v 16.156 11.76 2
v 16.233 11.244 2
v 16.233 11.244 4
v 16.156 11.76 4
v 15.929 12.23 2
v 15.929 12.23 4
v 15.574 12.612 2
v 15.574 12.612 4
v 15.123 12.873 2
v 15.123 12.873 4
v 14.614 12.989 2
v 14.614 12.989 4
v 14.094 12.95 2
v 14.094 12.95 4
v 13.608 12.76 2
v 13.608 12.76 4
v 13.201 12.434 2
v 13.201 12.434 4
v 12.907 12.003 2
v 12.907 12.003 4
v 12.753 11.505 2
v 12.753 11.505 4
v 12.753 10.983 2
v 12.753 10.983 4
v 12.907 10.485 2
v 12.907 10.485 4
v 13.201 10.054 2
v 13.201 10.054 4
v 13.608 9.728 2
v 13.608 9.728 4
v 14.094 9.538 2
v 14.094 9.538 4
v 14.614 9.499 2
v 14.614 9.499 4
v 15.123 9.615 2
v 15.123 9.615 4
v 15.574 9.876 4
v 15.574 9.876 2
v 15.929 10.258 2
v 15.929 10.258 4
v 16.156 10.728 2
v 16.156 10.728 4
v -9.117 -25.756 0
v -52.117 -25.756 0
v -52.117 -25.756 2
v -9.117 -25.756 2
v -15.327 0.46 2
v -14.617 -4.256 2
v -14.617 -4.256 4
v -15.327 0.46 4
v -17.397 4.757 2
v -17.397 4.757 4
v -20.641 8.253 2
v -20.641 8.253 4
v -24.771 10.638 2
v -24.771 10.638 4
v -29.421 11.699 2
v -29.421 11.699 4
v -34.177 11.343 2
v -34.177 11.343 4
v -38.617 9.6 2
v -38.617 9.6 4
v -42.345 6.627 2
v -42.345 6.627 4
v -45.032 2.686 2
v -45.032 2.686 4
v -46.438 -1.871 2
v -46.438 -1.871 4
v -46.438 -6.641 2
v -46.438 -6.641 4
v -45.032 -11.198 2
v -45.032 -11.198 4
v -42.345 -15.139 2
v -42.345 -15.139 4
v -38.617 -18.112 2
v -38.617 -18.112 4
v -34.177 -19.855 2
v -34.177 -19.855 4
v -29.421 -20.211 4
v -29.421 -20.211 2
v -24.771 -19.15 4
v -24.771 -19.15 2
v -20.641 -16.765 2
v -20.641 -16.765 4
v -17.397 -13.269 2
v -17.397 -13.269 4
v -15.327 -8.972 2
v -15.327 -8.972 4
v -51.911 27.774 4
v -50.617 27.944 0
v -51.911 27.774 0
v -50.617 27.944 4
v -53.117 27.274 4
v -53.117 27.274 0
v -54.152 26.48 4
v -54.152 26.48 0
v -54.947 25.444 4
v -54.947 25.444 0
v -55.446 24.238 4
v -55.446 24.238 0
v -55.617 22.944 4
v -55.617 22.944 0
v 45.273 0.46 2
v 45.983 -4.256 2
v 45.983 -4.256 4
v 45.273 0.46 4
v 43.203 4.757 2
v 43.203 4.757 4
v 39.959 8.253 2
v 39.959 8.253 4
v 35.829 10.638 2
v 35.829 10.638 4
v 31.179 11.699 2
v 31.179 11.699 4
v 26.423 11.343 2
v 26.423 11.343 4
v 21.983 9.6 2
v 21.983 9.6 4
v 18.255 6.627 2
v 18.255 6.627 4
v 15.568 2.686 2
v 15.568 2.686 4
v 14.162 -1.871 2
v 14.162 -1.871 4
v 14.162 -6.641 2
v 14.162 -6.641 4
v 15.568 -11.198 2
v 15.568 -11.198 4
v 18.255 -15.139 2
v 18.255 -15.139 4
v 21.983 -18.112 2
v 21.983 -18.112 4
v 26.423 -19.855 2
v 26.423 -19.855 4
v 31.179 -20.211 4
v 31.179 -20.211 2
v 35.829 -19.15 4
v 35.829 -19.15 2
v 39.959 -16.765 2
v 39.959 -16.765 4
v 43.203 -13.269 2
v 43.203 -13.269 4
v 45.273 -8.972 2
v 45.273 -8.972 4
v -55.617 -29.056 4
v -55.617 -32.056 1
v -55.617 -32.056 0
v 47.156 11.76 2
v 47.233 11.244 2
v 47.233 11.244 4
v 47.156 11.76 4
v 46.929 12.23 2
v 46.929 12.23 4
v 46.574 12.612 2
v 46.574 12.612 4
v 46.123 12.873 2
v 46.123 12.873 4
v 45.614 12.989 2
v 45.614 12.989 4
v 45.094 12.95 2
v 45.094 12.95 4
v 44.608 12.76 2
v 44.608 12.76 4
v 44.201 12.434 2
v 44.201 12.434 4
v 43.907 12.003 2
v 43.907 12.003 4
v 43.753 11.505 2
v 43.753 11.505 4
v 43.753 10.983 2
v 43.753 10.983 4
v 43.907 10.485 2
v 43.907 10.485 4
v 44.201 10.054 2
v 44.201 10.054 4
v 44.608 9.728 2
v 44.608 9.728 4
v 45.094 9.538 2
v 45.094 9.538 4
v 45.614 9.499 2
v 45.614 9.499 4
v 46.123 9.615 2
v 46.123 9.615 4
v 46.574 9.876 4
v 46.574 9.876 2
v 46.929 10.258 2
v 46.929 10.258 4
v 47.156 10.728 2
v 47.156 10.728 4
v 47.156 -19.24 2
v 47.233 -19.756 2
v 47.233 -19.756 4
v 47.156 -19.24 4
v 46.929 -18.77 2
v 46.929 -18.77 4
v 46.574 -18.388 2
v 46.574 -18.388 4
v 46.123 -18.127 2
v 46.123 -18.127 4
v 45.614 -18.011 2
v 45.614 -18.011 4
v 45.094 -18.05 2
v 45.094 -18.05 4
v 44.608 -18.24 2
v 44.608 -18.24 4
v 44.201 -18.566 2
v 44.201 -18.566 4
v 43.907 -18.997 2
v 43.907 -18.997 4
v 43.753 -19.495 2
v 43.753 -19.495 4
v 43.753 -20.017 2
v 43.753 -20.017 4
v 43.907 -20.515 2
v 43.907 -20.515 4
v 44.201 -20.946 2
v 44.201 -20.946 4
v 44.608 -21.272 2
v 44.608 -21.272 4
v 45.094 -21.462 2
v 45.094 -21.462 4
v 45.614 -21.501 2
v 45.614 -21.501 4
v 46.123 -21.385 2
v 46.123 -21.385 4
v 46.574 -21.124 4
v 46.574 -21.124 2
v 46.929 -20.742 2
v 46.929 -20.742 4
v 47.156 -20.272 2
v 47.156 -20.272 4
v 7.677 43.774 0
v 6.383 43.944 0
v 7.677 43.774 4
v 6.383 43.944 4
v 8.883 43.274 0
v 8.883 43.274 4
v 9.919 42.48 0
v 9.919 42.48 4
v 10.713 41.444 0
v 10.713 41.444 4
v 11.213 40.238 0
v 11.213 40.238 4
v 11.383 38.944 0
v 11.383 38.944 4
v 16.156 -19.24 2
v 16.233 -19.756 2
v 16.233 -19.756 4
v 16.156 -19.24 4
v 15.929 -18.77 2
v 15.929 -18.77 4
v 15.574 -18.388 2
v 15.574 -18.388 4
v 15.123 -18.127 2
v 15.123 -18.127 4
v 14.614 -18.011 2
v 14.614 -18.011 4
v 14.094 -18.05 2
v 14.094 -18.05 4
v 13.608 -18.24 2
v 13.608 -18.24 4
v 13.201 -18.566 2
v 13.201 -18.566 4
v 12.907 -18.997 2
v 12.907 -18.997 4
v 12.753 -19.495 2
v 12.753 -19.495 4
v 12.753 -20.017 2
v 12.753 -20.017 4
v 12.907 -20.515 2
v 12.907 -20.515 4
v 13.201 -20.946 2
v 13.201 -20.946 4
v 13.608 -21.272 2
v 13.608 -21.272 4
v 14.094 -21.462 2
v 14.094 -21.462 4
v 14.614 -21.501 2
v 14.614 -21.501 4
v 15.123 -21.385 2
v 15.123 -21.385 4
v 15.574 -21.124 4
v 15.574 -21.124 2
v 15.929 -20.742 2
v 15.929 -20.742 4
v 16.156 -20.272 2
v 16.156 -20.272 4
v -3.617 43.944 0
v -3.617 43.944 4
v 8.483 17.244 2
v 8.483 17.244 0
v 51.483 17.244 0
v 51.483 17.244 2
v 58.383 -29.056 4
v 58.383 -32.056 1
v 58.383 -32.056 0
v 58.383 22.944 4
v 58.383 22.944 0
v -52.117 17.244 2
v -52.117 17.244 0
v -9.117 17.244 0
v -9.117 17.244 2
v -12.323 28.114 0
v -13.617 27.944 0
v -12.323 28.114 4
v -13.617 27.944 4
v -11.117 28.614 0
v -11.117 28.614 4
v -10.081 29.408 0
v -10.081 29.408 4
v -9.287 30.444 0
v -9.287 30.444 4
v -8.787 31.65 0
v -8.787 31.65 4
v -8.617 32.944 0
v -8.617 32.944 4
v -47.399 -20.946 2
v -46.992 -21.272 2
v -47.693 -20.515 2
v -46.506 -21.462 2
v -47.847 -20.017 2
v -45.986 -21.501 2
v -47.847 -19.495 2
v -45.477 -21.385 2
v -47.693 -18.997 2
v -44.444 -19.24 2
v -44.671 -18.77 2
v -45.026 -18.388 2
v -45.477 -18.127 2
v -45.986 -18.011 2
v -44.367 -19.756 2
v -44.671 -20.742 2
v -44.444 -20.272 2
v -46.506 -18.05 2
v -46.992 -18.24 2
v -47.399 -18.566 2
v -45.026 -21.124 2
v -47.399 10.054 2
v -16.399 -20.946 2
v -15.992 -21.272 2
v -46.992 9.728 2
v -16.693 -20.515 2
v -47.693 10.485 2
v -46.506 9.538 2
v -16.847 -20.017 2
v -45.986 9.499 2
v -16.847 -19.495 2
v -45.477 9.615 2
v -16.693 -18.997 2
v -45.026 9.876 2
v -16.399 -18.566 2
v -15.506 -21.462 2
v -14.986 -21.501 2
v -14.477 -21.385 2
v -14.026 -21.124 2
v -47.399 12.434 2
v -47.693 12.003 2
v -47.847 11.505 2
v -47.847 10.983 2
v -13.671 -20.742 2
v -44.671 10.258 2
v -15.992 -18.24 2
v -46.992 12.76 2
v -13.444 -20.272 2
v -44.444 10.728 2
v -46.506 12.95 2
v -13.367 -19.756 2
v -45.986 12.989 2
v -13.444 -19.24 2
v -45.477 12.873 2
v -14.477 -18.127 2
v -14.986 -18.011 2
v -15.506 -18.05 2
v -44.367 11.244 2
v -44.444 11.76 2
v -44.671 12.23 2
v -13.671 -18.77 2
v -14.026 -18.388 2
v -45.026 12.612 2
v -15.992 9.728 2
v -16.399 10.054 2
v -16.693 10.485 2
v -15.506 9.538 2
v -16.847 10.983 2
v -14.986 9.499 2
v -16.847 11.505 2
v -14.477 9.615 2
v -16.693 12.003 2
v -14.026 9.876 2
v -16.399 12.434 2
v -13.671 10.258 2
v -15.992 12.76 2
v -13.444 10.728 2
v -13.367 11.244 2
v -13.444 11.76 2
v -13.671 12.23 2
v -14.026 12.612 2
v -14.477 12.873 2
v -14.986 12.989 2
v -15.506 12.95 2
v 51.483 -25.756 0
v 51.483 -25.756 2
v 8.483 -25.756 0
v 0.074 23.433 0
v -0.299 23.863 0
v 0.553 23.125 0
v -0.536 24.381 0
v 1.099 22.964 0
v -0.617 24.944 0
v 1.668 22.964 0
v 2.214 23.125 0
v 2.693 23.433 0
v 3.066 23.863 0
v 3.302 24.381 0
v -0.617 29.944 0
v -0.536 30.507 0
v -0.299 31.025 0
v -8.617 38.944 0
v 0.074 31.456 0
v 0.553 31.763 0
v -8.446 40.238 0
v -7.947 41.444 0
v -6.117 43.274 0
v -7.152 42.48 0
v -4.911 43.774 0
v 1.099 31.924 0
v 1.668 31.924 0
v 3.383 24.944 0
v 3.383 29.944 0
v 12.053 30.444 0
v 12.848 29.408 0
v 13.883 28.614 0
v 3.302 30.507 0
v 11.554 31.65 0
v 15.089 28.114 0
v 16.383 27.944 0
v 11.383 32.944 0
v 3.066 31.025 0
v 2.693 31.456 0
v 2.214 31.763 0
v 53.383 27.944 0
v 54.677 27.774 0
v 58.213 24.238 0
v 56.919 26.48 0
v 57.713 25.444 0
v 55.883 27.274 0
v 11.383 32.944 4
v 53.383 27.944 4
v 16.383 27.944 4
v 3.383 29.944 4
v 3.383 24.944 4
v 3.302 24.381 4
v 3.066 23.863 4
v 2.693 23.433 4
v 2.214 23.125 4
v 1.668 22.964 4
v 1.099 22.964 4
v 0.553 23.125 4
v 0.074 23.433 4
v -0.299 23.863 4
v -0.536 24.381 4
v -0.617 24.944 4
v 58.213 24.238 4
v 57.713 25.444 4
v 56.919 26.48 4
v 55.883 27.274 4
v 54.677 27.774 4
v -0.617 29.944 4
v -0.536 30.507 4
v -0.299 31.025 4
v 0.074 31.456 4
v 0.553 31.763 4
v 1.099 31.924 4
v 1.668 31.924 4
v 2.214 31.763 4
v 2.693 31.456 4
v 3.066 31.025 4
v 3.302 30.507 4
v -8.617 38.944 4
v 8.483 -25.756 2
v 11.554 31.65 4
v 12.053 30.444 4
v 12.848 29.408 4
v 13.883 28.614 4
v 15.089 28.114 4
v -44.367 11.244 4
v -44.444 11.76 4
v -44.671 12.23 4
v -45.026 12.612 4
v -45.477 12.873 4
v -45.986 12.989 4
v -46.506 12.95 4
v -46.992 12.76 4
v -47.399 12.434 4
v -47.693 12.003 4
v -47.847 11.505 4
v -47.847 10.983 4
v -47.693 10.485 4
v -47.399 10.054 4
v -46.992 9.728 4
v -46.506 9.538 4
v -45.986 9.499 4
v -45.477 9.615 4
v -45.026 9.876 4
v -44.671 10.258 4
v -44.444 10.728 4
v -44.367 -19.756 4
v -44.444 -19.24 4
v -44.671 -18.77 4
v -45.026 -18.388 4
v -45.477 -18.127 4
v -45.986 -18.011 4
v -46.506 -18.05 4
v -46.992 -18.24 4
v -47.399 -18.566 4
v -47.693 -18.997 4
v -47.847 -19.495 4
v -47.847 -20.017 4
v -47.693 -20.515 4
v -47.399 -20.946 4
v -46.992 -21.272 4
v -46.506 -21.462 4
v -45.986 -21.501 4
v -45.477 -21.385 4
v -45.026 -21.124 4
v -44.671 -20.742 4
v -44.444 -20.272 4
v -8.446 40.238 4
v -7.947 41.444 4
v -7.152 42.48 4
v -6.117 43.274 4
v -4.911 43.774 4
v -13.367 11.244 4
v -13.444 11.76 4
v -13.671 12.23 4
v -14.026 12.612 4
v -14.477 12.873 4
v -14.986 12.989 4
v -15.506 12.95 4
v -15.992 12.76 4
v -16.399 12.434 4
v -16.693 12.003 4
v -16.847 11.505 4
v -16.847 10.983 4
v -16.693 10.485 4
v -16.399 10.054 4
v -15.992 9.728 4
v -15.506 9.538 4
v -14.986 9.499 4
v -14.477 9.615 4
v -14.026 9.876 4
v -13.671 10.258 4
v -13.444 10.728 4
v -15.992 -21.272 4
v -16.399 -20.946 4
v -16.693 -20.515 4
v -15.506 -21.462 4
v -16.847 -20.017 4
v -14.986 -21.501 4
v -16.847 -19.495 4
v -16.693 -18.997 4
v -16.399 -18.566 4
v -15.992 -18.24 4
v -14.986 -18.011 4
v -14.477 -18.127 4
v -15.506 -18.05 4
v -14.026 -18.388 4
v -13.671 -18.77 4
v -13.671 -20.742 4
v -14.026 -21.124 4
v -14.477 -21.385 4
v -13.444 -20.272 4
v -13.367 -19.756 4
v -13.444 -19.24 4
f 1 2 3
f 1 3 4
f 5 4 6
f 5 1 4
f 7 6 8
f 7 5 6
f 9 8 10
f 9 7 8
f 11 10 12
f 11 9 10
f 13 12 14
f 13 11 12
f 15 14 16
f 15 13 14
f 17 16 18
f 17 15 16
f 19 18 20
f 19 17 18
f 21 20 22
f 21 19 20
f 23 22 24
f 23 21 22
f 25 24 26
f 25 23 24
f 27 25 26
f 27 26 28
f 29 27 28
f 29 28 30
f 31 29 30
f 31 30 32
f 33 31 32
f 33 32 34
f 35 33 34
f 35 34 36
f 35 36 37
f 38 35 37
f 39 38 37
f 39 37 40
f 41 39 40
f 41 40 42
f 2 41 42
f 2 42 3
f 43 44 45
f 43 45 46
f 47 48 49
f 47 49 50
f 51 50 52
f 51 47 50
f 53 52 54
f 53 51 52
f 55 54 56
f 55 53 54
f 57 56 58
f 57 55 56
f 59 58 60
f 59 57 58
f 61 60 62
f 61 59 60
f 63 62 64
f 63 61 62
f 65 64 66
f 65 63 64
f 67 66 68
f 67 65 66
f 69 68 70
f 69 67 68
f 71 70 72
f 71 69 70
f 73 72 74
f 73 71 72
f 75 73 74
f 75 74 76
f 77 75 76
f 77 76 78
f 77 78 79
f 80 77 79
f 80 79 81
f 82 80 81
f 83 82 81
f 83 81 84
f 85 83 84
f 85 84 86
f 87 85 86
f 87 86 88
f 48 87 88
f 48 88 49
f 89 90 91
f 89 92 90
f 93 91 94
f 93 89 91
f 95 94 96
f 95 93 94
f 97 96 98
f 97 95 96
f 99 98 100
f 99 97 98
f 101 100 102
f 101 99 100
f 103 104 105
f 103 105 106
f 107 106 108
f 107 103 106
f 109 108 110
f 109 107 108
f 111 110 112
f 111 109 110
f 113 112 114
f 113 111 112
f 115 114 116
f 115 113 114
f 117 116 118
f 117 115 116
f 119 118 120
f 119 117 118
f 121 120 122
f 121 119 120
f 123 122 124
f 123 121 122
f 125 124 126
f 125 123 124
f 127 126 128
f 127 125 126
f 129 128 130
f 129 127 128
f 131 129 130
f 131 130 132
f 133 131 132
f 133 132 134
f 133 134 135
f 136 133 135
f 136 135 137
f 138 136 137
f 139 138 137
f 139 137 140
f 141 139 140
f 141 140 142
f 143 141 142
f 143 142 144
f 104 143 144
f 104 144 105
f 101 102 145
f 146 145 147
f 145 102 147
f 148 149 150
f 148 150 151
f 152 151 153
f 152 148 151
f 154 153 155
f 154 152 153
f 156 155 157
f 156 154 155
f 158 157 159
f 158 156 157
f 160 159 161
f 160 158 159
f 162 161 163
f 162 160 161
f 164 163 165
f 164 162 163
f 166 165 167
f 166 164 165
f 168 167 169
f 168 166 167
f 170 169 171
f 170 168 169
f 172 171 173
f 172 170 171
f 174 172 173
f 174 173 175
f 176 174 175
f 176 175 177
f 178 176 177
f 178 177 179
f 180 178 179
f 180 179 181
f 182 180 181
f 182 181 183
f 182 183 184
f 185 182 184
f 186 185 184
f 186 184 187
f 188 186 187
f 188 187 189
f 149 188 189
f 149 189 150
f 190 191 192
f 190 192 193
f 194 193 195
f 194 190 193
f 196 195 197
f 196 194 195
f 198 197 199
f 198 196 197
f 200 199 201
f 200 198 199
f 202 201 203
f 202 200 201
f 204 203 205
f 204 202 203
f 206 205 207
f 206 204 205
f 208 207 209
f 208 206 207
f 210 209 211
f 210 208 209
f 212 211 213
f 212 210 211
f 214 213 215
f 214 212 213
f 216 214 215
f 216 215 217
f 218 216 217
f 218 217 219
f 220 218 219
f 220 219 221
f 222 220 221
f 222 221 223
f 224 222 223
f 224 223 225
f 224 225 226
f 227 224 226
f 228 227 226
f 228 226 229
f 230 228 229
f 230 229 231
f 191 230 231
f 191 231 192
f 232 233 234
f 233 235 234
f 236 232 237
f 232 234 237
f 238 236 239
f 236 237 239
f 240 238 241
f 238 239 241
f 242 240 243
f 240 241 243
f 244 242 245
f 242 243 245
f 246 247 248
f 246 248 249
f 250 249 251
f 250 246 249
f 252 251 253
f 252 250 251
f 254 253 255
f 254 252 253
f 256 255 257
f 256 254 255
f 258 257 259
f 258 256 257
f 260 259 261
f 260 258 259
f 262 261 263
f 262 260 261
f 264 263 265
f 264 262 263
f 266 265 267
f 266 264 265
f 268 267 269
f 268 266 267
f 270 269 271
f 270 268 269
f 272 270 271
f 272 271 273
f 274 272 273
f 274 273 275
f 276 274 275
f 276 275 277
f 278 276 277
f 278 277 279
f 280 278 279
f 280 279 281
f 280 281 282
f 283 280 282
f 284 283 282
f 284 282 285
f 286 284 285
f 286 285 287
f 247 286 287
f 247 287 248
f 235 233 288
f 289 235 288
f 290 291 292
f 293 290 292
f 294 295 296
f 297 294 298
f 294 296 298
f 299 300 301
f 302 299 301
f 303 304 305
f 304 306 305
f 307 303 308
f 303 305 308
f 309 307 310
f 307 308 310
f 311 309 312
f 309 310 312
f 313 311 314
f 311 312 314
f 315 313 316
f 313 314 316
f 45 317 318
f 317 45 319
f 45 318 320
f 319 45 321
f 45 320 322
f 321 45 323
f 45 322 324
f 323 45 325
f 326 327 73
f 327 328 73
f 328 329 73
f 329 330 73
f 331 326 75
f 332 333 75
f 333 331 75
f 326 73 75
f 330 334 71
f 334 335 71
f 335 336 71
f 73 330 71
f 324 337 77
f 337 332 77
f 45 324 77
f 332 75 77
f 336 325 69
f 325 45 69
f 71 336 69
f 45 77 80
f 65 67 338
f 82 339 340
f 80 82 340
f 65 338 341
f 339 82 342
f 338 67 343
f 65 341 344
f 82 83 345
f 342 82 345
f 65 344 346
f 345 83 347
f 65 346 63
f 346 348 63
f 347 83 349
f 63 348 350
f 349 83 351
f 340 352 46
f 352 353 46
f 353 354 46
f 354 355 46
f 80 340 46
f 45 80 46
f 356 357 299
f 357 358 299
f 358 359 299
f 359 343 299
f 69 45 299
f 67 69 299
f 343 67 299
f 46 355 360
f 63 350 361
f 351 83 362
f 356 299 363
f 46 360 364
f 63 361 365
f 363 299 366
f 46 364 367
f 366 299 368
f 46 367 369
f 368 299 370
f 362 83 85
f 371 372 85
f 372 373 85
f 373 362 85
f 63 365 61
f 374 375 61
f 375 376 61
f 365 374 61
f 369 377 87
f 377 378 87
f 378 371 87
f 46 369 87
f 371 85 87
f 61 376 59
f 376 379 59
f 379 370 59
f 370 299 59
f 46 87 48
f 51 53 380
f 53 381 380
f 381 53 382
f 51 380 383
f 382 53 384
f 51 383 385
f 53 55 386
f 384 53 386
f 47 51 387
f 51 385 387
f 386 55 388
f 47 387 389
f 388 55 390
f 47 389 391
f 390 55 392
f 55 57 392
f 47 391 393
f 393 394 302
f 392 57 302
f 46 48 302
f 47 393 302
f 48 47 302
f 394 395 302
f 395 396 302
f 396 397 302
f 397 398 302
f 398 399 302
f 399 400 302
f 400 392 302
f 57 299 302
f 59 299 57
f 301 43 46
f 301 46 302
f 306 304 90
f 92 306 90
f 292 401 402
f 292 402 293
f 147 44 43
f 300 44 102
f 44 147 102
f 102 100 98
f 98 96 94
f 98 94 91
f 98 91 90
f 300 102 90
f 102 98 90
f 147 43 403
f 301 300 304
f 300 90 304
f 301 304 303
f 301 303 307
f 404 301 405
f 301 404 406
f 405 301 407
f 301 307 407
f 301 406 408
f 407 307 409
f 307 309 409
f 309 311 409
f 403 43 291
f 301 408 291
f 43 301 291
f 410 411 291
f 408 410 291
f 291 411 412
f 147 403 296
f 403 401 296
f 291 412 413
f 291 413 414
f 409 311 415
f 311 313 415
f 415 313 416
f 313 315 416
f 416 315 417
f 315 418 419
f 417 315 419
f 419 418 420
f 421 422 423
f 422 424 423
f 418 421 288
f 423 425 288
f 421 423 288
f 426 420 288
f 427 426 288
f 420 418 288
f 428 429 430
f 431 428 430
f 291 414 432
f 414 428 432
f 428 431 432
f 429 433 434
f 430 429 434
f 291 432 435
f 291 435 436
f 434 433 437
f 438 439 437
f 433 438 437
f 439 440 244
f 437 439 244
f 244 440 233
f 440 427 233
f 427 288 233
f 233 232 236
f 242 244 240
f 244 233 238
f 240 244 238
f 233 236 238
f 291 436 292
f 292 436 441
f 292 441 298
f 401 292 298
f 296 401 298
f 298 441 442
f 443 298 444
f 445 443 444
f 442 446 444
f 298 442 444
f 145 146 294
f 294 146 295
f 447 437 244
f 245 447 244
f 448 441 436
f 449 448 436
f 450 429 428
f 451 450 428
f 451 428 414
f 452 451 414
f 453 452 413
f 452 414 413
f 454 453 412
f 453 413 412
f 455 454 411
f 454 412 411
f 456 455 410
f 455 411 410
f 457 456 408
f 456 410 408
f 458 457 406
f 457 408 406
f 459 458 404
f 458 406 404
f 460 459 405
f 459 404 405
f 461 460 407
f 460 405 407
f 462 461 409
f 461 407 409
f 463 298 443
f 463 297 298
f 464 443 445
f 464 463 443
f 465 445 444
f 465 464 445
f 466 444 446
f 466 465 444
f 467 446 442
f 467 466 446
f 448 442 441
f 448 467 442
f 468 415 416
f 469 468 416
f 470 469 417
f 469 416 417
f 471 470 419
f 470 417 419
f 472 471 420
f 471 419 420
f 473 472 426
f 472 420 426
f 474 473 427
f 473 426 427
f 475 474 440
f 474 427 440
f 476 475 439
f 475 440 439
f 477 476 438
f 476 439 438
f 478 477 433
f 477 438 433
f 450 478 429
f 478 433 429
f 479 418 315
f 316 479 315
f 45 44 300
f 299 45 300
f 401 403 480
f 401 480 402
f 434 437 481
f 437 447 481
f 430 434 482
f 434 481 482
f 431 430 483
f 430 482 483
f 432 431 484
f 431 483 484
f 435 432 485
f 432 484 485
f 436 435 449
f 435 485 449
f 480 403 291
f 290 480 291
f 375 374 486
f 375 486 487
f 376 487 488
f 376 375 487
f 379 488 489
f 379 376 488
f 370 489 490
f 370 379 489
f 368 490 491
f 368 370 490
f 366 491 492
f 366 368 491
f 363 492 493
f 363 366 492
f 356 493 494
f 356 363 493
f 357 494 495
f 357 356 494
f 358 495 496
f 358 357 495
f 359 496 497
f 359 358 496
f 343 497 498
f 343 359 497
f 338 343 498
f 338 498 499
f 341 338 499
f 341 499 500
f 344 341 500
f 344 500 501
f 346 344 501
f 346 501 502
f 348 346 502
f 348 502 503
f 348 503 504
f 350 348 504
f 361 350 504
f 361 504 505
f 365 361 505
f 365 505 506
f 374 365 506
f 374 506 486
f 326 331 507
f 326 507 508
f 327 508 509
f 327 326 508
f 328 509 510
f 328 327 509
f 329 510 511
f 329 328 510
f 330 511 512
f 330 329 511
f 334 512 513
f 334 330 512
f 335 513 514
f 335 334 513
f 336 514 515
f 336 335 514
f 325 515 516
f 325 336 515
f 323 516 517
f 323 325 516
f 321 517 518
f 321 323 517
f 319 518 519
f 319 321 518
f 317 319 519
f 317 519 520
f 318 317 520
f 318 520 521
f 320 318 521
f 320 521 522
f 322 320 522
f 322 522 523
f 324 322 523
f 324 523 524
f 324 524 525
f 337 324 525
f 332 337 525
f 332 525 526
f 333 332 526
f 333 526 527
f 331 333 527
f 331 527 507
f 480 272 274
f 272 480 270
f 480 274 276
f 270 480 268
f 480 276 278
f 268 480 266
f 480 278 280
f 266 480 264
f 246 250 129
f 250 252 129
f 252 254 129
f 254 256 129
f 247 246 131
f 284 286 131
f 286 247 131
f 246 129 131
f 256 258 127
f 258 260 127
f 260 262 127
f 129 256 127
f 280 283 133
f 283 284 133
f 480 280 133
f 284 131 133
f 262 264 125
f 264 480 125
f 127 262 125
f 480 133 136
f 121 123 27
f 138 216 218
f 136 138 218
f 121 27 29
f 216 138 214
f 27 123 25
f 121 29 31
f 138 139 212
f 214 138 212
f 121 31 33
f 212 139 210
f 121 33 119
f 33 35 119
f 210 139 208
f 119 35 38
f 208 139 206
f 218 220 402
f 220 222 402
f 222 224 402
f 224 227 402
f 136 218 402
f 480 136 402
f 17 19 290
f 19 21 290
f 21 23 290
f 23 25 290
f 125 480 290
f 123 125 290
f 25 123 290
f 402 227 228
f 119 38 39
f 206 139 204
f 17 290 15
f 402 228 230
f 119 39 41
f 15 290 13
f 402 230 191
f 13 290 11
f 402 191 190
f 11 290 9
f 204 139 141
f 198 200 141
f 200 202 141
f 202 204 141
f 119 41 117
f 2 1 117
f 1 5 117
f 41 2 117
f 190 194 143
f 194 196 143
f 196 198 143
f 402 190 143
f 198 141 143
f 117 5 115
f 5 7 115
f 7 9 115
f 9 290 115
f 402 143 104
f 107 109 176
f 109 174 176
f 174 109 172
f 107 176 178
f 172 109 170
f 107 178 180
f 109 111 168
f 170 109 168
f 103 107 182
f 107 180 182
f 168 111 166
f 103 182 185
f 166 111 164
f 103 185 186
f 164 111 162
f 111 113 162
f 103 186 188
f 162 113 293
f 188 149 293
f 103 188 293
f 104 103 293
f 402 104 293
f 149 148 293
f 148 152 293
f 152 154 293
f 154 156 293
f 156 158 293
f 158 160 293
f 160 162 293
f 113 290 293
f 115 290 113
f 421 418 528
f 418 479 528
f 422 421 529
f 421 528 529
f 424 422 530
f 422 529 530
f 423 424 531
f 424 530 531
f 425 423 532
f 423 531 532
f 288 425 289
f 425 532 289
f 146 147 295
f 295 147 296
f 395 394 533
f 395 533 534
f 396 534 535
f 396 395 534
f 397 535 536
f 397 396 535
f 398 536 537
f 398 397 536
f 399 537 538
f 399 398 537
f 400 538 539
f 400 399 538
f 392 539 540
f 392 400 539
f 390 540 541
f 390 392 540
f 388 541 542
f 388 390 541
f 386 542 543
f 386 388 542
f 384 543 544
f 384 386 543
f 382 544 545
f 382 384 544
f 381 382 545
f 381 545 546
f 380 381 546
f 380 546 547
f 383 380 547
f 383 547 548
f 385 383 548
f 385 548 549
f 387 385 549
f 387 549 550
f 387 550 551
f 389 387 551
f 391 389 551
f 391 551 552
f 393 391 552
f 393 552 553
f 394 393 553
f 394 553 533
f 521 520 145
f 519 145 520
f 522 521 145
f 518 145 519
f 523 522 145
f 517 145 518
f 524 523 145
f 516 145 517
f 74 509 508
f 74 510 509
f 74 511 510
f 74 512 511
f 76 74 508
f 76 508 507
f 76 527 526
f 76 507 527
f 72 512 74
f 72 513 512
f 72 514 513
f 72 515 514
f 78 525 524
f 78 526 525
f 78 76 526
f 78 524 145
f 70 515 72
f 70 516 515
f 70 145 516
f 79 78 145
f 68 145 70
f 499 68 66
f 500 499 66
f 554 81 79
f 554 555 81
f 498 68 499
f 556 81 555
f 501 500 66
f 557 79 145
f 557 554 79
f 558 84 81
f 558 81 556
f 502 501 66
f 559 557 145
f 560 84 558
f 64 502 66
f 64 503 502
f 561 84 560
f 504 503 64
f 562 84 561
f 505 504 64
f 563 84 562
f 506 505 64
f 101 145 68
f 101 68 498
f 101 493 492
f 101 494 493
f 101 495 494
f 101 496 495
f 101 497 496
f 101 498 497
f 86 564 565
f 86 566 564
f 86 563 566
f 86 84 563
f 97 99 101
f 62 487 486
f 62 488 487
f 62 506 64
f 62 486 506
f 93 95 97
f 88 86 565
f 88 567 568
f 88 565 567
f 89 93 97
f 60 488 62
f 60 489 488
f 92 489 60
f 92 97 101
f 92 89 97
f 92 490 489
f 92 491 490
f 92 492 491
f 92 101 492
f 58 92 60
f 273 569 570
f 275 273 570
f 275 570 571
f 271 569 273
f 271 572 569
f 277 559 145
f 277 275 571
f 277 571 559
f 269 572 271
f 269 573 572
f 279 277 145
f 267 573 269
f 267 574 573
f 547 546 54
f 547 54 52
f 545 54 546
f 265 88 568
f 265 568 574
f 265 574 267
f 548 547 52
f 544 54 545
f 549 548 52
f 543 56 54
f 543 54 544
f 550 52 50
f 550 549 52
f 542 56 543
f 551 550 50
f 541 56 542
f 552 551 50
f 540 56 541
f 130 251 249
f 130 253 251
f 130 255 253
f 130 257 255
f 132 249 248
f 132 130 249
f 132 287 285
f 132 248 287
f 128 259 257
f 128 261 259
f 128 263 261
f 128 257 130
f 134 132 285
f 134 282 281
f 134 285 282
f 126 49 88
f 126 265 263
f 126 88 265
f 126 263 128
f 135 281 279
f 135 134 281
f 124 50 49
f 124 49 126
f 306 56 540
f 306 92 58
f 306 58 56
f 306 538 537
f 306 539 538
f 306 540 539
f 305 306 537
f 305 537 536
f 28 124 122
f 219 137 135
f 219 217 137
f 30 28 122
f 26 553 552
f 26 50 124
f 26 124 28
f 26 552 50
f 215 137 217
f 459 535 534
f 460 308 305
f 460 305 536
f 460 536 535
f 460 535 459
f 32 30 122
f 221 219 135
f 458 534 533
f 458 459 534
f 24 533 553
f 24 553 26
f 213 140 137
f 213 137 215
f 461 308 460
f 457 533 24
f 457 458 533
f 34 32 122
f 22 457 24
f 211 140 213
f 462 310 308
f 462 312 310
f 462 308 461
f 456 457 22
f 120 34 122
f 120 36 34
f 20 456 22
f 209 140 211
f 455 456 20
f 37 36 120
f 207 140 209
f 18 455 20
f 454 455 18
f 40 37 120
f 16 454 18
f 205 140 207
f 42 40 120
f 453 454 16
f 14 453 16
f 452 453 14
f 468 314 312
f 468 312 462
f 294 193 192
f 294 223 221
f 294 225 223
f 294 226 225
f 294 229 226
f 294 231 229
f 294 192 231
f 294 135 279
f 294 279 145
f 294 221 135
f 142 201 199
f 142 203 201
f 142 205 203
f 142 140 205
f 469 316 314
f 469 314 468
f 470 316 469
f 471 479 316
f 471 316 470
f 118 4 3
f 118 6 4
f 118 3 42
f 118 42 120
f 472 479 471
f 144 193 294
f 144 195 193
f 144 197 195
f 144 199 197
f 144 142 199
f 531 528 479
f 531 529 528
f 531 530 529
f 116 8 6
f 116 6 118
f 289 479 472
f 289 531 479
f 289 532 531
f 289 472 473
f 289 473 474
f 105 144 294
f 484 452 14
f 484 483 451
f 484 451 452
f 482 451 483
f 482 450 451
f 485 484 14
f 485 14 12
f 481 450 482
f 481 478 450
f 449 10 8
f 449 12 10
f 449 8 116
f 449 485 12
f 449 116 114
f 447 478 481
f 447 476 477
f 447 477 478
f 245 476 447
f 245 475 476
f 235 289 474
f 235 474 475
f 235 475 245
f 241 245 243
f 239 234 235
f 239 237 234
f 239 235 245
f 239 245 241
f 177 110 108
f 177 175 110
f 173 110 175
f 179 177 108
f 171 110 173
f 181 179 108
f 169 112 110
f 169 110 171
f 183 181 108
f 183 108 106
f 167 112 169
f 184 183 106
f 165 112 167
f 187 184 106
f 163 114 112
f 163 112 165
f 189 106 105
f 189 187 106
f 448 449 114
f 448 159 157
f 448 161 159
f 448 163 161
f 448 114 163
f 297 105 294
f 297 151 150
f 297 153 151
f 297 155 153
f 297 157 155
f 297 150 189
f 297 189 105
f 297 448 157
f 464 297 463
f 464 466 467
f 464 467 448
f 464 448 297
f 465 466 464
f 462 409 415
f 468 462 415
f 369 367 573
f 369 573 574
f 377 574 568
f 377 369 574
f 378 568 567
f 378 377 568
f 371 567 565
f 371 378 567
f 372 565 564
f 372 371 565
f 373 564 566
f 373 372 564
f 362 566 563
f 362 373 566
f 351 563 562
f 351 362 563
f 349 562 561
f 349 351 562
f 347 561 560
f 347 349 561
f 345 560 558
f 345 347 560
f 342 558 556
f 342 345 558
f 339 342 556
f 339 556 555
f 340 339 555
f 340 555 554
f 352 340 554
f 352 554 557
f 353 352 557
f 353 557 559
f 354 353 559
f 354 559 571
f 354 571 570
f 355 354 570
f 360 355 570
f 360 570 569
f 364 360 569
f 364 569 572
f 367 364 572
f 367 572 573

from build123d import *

# Parameters (mm, degrees)
F0_W          = 43
F0_H          = 43
F0_R          = 1.75
F0_R_2        = 16
F1_DEPTH      = 4
F2_R          = 5
F3_SIZE       = 3
F4_DEPTH      = 4
F4_DEPTH_BACK = 2


with BuildPart() as f1:
    # F0 (on Top) → F1 (new body)
    with BuildSketch(Plane.XY):
        Polygon((-8.6166327415, 27.9440277213), (-55.6166327415, 27.9440277213), (-55.6166327415, -32.0559722787), (58.3833672585, -32.0559722787), (58.3833672585, 27.9440277213), (11.3833672585, 27.9440277213), (11.3833672585, 43.9440277213), (-8.6166327415, 43.9440277213), align=None)
        with Locations((-30.6166327415, -4.2559722787)):
            Rectangle(F0_W, F0_H, mode=Mode.SUBTRACT)
        with Locations((29.9833672585, -4.2559722787)):
            Rectangle(F0_W, F0_H, mode=Mode.SUBTRACT)
        with BuildLine():
            ThreePointArc((-0.6166327415, 29.9440277213), (1.3833672585, 31.9440277213), (3.3833672585, 29.9440277213))
            Line((3.3833672585, 29.9440277213), (3.3833672585, 24.9440277213))
            ThreePointArc((3.3833672585, 24.9440277213), (1.3833672585, 22.9440277213), (-0.6166327415, 24.9440277213))
            Line((-0.6166327415, 24.9440277213), (-0.6166327415, 29.9440277213))
        make_face(mode=Mode.SUBTRACT)
        with Locations((-30.6166327415, -4.2559722787)):
            Rectangle(F0_W, F0_H)
        with Locations((-46.1166327415, -19.7559722787)):
            Circle(F0_R, mode=Mode.SUBTRACT)
        with Locations((-15.1166327415, -19.7559722787)):
            Circle(F0_R, mode=Mode.SUBTRACT)
        with Locations((-30.6166327415, -4.2559722787)):
            Circle(F0_R_2, mode=Mode.SUBTRACT)
        with Locations((-46.1166327415, 11.2440277213)):
            Circle(F0_R, mode=Mode.SUBTRACT)
        with Locations((-15.1166327415, 11.2440277213)):
            Circle(F0_R, mode=Mode.SUBTRACT)
        with Locations((29.9833672585, -4.2559722787)):
            Rectangle(F0_W, F0_H)
        with Locations((14.4833672585, -19.7559722787)):
            Circle(F0_R, mode=Mode.SUBTRACT)
        with Locations((45.4833672585, -19.7559722787)):
            Circle(F0_R, mode=Mode.SUBTRACT)
        with Locations((29.9833672585, -4.2559722787)):
            Circle(F0_R_2, mode=Mode.SUBTRACT)
        with Locations((14.4833672585, 11.2440277213)):
            Circle(F0_R, mode=Mode.SUBTRACT)
        with Locations((45.4833672585, 11.2440277213)):
            Circle(F0_R, mode=Mode.SUBTRACT)
    extrude(amount=F1_DEPTH)

    # F2
    f2_edges = [f1.edges().sort_by_distance(p)[0] for p in [
        (-8.616633, 43.944028, 2),
        (-8.616633, 27.944028, 2),
        (-55.616633, 27.944028, 2),
        (11.383367, 43.944028, 2),
        (11.383367, 27.944028, 2),
        (58.383367, 27.944028, 2),
    ]]
    fillet(f2_edges, radius=F2_R)

    # F3
    f3_edges = [f1.edges().sort_by_distance(p)[0] for p in [
        (1.383367, -32.055972, 4),
    ]]
    chamfer(f3_edges, length=F3_SIZE)

    # F0 (on Top) → F4 (cut, two sides)
    with BuildSketch(Plane.XY) as f4_sk:
        with Locations((-30.6166327415, -4.2559722787)):
            Rectangle(F0_W, F0_H)
        with Locations((-46.1166327415, -19.7559722787)):
            Circle(F0_R, mode=Mode.SUBTRACT)
        with Locations((-15.1166327415, -19.7559722787)):
            Circle(F0_R, mode=Mode.SUBTRACT)
        with Locations((-30.6166327415, -4.2559722787)):
            Circle(F0_R_2, mode=Mode.SUBTRACT)
        with Locations((-46.1166327415, 11.2440277213)):
            Circle(F0_R, mode=Mode.SUBTRACT)
        with Locations((-15.1166327415, 11.2440277213)):
            Circle(F0_R, mode=Mode.SUBTRACT)
        with Locations((29.9833672585, -4.2559722787)):
            Rectangle(F0_W, F0_H)
        with Locations((14.4833672585, -19.7559722787)):
            Circle(F0_R, mode=Mode.SUBTRACT)
        with Locations((45.4833672585, -19.7559722787)):
            Circle(F0_R, mode=Mode.SUBTRACT)
        with Locations((29.9833672585, -4.2559722787)):
            Circle(F0_R_2, mode=Mode.SUBTRACT)
        with Locations((14.4833672585, 11.2440277213)):
            Circle(F0_R, mode=Mode.SUBTRACT)
        with Locations((45.4833672585, 11.2440277213)):
            Circle(F0_R, mode=Mode.SUBTRACT)
    extrude(amount=-F4_DEPTH, mode=Mode.SUBTRACT)
    extrude(f4_sk.sketch, amount=F4_DEPTH_BACK, mode=Mode.SUBTRACT)


solid = f1.part
